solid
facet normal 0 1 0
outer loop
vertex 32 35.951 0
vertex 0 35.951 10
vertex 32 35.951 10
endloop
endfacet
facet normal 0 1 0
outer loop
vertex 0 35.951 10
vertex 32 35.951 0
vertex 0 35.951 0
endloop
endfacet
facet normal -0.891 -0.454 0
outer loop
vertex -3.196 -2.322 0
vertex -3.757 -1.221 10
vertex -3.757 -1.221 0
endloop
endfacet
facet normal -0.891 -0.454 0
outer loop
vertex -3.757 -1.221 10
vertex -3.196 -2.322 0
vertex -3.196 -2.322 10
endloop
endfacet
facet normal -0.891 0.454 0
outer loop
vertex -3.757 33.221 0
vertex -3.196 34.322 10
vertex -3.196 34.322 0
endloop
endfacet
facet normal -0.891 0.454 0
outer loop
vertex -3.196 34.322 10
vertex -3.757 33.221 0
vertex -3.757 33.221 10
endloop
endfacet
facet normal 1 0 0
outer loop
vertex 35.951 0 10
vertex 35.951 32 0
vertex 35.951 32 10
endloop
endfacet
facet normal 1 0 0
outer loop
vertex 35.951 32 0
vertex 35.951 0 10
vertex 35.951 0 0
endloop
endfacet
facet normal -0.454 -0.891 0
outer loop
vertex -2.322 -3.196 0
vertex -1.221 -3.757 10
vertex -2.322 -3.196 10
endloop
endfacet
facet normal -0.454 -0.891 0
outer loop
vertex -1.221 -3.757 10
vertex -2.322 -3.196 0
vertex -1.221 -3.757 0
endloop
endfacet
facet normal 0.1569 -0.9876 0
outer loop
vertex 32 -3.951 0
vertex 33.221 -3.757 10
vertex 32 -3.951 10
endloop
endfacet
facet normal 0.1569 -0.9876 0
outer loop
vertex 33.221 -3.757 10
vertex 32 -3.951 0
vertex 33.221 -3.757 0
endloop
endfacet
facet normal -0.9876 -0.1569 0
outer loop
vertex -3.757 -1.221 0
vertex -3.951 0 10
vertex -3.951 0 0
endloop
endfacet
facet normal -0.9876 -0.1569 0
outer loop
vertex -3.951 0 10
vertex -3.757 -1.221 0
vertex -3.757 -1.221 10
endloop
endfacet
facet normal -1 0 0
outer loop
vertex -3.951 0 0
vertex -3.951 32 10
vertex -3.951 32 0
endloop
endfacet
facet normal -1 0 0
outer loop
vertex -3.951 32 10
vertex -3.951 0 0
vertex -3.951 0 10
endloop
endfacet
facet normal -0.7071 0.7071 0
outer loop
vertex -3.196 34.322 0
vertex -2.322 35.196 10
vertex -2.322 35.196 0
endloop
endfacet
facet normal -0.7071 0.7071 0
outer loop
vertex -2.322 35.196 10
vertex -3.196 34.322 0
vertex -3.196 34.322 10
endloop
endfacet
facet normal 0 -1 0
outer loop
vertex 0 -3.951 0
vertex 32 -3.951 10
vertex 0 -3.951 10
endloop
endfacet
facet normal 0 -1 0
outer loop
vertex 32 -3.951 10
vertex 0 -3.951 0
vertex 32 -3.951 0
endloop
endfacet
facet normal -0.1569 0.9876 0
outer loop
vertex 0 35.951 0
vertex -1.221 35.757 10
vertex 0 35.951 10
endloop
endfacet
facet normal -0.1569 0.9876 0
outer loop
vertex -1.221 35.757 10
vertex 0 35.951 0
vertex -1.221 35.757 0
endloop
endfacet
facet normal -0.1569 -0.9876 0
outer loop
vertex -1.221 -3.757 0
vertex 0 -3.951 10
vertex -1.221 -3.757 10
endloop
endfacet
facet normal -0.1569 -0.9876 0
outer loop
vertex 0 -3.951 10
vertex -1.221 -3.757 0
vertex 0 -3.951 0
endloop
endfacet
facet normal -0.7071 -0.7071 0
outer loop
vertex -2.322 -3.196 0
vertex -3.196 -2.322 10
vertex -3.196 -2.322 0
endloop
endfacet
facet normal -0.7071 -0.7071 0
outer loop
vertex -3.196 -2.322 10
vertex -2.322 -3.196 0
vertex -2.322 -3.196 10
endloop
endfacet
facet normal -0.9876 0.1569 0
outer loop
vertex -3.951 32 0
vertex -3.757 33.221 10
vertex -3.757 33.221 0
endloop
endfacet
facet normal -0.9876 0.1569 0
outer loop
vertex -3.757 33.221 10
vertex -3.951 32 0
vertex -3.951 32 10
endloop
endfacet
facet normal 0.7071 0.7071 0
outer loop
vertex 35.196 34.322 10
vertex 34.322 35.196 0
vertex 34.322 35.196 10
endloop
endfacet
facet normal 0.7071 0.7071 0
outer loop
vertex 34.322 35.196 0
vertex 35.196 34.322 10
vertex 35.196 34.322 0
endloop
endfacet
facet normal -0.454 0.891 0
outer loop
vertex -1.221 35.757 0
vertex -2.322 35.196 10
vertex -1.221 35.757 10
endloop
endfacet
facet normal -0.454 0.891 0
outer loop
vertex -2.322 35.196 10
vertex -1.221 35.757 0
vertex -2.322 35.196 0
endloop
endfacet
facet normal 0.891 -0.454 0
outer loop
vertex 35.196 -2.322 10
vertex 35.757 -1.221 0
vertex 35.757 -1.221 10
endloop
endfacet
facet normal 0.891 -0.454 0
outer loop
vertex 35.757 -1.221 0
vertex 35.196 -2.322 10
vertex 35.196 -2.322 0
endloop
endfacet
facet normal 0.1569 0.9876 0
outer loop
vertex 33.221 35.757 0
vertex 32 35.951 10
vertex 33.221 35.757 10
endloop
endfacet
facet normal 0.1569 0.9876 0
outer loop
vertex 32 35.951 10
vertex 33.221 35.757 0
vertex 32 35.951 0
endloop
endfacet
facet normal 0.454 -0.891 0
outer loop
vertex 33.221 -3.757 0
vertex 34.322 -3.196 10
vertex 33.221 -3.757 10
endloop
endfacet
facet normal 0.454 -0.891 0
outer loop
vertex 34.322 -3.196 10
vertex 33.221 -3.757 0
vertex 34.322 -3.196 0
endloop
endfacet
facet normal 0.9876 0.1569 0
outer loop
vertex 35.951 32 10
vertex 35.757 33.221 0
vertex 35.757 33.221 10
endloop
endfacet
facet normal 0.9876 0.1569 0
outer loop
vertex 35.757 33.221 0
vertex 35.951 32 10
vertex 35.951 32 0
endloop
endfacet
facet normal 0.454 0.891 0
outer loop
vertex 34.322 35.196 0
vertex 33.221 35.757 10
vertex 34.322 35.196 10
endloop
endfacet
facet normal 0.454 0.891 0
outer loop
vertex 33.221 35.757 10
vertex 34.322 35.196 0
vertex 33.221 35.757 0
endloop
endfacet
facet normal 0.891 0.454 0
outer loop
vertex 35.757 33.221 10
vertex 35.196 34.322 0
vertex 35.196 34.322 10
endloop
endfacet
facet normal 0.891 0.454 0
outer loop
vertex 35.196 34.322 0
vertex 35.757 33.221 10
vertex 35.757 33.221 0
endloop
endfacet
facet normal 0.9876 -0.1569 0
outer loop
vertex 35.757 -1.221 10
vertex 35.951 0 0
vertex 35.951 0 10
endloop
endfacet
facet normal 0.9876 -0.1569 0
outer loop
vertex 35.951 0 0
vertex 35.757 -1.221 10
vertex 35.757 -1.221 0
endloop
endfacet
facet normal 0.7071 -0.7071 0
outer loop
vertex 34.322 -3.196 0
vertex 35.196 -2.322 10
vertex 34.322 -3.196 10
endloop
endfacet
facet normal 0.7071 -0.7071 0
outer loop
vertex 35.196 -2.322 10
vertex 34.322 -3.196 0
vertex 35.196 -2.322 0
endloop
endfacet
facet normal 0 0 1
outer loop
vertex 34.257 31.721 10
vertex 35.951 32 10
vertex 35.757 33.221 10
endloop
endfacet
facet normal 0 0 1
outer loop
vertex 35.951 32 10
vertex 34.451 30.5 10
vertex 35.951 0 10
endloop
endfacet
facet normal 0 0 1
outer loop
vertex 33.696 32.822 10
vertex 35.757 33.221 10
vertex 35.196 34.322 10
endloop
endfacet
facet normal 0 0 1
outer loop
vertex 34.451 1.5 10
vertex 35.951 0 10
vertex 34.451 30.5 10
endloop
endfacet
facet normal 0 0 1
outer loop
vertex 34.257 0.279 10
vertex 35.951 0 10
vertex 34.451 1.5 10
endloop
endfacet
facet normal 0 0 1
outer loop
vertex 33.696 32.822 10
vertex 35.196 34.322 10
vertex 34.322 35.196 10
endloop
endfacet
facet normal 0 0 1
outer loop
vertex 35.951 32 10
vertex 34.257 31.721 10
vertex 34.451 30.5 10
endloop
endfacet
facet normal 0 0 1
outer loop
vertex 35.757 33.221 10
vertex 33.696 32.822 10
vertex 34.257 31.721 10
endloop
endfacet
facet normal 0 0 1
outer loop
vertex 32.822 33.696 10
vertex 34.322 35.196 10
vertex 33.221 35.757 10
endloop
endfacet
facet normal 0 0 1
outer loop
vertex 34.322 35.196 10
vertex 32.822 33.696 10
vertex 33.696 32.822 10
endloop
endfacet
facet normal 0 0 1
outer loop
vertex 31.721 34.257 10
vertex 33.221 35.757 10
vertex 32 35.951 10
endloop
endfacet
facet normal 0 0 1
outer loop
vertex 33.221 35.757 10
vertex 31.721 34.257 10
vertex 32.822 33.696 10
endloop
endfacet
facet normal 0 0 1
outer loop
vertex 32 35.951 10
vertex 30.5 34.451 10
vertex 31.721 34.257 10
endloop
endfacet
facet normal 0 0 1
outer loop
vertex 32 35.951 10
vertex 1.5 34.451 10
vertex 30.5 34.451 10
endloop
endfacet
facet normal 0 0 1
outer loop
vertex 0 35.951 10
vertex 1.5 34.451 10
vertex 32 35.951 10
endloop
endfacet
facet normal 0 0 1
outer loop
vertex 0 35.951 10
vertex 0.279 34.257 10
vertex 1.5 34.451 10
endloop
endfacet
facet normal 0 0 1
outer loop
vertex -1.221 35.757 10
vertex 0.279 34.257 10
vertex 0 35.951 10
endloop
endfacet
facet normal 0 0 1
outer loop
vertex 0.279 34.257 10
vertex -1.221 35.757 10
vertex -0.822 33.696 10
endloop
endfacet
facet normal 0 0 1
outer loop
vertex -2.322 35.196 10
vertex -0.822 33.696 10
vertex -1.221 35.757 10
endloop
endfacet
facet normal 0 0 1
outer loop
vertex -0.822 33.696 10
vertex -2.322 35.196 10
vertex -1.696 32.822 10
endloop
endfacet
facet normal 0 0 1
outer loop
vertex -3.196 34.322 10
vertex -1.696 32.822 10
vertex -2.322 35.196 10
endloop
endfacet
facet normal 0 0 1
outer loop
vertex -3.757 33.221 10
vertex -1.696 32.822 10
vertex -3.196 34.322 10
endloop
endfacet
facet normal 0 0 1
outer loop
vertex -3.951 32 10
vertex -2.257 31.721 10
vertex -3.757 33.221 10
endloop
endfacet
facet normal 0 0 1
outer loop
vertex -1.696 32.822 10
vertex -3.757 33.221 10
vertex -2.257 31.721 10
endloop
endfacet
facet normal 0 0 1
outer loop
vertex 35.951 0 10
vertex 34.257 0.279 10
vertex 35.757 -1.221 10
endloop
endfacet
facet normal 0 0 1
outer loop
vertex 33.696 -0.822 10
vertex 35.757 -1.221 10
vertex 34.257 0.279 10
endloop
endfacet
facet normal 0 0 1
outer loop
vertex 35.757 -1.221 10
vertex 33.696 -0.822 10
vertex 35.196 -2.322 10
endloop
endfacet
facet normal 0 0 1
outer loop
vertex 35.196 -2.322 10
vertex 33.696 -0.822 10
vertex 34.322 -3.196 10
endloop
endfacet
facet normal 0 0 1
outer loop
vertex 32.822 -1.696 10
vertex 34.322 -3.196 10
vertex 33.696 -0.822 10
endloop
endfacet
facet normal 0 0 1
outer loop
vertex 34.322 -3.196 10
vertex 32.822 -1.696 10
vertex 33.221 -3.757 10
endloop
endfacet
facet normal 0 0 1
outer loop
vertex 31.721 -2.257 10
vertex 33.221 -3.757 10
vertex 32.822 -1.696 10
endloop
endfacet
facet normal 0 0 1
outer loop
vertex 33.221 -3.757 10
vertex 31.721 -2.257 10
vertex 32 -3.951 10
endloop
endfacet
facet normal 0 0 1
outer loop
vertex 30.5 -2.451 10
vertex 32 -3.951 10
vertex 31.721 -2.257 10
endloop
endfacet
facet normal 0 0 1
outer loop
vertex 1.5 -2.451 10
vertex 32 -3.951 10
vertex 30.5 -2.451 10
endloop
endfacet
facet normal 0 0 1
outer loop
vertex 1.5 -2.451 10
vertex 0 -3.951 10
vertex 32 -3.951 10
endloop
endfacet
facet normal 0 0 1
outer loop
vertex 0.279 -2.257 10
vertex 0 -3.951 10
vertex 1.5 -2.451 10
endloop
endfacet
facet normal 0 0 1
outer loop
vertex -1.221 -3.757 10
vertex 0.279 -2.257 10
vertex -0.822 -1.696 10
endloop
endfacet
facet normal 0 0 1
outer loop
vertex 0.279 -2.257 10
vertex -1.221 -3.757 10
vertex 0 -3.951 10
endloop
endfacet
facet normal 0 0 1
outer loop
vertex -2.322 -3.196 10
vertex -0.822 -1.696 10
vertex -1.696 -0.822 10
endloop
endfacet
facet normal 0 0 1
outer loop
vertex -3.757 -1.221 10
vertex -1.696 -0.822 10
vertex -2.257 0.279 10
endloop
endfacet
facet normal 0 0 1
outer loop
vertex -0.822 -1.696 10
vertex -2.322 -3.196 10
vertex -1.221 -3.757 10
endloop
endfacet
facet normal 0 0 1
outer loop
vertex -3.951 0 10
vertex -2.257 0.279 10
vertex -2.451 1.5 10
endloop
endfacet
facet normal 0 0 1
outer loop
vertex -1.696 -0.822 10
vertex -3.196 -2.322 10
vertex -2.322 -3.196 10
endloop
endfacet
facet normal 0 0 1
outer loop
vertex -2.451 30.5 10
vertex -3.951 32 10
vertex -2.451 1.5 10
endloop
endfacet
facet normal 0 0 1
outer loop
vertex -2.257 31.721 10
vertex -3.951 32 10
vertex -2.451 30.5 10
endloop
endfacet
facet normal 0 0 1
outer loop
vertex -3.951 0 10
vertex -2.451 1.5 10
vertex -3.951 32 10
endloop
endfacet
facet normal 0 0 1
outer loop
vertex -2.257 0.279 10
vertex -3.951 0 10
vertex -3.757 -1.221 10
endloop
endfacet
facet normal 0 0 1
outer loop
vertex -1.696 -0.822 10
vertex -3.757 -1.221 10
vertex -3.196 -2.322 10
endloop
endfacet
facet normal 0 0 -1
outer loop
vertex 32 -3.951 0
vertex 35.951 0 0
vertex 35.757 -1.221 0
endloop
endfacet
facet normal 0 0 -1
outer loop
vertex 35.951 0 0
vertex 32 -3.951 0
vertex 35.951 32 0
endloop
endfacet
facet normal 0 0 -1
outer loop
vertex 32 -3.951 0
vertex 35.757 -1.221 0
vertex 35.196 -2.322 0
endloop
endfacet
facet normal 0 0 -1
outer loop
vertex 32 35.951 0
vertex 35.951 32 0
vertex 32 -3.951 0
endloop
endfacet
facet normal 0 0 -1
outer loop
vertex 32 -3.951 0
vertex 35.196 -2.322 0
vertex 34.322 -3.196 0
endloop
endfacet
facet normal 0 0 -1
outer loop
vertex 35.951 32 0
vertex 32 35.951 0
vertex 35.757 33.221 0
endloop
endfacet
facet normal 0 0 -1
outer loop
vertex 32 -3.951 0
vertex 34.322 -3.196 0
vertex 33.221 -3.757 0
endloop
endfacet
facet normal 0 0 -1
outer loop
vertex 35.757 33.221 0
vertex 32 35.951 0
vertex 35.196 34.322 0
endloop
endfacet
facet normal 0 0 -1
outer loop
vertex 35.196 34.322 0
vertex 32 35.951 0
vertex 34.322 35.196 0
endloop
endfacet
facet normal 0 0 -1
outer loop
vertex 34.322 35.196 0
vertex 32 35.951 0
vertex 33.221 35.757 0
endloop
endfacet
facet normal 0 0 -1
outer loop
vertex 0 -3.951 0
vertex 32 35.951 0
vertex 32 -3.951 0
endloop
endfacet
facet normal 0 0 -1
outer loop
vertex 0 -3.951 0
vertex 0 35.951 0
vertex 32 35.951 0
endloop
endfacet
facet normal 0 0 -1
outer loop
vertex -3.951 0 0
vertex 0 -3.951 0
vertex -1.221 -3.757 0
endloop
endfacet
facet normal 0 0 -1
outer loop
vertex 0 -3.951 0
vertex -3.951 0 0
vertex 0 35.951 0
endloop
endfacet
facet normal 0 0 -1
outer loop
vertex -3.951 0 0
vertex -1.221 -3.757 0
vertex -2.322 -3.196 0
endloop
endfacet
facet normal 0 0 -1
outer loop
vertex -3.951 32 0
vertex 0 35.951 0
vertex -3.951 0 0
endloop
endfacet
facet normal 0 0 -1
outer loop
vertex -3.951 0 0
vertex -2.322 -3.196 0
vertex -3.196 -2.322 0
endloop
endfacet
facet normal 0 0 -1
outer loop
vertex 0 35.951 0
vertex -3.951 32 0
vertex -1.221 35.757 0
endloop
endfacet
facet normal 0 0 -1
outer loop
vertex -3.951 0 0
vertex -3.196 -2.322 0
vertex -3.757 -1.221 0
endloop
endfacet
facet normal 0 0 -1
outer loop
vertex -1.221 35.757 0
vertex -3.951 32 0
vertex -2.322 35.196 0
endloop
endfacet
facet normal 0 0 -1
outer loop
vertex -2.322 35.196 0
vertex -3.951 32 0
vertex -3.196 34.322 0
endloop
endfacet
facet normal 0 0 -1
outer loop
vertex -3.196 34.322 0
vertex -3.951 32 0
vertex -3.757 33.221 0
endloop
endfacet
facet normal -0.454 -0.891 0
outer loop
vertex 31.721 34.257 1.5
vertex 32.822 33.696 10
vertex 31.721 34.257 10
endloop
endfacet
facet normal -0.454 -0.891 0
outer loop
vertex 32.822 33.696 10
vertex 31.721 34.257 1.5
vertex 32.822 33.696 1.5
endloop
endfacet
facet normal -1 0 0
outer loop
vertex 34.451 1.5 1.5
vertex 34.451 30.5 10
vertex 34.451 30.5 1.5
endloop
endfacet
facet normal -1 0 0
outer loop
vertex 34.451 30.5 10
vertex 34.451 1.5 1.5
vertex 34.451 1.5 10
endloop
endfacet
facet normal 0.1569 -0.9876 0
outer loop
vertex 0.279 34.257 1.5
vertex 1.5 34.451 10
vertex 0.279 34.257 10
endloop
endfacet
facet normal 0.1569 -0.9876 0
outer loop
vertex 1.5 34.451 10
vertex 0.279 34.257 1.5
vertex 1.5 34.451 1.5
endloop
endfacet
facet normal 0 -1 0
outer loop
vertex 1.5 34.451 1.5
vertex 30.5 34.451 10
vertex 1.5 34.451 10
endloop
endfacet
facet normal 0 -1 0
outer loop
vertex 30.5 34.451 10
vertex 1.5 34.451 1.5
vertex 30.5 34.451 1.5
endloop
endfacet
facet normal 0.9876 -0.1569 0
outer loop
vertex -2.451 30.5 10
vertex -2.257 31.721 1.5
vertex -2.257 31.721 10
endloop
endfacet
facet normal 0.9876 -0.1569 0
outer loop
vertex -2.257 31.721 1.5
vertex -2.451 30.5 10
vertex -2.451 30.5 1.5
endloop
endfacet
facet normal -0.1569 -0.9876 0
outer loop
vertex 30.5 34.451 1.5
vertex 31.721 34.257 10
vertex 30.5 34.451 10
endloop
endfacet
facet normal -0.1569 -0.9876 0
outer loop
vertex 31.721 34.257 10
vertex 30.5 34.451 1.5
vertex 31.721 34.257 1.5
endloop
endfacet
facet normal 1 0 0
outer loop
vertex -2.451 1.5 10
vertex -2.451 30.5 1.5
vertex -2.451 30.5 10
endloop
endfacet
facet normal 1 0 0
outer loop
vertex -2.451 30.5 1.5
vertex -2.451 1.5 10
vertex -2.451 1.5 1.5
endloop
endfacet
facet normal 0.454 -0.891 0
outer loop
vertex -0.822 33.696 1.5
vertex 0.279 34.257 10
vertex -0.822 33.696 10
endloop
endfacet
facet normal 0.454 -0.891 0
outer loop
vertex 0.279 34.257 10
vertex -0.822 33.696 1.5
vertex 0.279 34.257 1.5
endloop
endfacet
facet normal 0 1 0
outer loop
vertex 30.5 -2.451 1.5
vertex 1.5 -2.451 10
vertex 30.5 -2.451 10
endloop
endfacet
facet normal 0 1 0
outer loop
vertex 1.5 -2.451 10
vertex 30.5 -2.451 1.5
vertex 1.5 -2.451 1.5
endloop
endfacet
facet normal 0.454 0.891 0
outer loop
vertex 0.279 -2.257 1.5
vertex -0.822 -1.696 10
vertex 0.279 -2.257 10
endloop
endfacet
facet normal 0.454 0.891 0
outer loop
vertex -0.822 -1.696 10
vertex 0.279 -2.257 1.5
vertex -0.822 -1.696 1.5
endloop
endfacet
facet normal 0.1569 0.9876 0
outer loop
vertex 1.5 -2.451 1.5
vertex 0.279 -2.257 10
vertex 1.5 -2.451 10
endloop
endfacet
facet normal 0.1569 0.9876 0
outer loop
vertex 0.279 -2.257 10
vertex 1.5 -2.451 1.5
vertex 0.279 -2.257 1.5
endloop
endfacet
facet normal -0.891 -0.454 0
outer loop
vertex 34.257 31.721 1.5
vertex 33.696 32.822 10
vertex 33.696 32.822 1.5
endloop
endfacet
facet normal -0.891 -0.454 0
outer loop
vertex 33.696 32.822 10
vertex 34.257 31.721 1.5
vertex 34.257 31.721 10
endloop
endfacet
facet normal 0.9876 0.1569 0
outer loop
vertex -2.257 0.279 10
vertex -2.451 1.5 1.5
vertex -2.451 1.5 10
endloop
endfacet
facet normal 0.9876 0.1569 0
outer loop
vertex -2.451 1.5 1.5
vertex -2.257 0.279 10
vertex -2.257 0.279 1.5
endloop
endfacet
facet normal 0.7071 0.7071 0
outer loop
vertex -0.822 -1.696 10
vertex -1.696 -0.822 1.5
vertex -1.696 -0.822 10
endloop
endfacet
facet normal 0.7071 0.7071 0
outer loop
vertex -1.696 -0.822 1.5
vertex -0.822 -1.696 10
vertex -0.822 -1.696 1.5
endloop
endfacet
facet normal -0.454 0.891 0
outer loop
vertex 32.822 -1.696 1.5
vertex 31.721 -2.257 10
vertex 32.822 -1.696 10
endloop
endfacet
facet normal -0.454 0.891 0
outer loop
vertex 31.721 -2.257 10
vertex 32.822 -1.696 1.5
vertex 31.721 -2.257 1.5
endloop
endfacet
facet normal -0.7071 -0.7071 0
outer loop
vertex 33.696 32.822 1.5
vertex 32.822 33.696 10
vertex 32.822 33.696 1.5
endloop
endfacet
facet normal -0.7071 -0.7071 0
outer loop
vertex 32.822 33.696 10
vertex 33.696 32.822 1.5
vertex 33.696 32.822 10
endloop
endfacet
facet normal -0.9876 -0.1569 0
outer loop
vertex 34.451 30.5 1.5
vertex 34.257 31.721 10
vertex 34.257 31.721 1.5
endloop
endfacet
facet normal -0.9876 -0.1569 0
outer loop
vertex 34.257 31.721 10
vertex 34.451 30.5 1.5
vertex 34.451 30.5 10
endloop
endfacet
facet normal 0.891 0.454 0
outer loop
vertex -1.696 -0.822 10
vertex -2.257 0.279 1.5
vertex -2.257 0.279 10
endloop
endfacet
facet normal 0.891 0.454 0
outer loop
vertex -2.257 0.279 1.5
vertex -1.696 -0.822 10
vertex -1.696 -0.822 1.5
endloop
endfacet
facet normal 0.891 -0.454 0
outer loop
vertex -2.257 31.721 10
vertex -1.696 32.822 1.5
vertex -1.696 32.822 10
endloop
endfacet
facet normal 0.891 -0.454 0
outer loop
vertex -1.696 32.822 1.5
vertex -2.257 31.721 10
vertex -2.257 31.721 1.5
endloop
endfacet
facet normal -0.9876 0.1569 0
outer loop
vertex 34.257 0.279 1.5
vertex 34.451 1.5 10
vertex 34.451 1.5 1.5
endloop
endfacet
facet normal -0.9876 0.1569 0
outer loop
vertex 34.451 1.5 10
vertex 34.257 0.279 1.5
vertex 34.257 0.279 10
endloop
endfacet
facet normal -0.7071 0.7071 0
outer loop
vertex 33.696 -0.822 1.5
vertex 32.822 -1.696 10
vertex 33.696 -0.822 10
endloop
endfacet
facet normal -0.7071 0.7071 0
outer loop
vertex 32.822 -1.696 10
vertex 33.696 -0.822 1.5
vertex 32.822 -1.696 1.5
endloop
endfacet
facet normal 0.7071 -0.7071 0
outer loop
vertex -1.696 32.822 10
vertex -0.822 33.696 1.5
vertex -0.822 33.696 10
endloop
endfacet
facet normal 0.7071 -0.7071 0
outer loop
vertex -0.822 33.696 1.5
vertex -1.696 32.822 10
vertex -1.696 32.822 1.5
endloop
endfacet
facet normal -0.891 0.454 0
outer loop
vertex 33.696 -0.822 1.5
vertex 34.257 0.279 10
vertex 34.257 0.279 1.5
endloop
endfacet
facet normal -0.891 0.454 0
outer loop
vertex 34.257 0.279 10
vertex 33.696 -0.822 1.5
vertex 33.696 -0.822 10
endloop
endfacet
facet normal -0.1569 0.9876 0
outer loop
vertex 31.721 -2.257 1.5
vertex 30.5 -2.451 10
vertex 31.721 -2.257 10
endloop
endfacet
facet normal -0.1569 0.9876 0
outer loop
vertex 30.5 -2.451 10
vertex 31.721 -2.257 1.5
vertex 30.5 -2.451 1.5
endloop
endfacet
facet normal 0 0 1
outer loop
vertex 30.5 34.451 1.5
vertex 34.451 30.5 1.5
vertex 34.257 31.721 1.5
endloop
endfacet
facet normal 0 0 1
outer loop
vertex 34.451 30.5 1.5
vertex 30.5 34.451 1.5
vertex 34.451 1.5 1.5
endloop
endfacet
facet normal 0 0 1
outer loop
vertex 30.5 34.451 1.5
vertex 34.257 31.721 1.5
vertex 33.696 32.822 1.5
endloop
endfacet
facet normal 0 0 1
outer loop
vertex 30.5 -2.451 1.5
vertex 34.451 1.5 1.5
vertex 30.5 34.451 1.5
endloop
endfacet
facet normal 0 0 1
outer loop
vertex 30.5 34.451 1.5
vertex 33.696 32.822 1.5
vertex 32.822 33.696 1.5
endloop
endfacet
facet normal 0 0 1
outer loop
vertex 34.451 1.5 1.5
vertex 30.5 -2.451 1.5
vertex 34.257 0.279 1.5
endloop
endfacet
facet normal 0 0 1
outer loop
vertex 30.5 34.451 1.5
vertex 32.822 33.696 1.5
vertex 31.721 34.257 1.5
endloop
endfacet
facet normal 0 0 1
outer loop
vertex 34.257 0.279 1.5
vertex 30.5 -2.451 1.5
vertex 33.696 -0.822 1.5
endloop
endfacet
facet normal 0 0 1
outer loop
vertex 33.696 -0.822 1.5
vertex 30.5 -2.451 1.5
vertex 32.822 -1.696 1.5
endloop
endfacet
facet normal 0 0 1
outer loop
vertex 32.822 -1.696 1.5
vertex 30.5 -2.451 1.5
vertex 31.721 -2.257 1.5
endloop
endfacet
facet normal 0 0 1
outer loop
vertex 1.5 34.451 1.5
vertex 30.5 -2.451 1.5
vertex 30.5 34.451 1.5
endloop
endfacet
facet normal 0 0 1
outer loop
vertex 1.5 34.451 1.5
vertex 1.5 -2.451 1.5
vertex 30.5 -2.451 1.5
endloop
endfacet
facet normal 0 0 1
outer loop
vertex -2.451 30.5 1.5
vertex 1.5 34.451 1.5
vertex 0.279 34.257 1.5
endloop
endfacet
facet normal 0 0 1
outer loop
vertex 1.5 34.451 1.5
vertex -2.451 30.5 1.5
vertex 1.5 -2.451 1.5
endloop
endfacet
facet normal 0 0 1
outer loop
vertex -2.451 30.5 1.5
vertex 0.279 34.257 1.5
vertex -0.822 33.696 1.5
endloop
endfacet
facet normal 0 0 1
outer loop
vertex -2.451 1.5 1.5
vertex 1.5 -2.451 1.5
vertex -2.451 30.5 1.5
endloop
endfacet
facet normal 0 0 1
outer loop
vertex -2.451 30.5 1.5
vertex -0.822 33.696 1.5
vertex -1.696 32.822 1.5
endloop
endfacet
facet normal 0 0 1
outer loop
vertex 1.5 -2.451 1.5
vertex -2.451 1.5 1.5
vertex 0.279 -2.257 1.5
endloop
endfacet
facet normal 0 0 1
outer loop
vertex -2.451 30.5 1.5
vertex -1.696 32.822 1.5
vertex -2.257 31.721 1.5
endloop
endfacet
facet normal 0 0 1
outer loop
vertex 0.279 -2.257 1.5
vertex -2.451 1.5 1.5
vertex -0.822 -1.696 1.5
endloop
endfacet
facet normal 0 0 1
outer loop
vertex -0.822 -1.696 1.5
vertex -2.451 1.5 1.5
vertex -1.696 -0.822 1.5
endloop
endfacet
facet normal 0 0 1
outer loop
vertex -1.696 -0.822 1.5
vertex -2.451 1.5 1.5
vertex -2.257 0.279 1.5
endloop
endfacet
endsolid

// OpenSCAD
largeur_pi = 40;
longueur_pi = 40;
hauteur_gpio = 10;
epaisseur = 1.5;
rayon_arrondi = 4;
detail = 20;



module rounded_block(longueur, largeur, hauteur, rayon){
	difference(){
		minkowski(){
			cube([longueur-2*rayon, largeur-2*rayon, hauteur]);
			sphere (rayon, $fn=detail);
		}
		translate([-rayon,-rayon,hauteur]) cube([longueur, largeur, rayon]);
		translate([-rayon,-rayon,-rayon]) cube([longueur, largeur, rayon]);
	}
	
}

module rounded_box(longueur, largeur, hauteur, rayon, epaisseur){
	difference(){
		rounded_block(longueur, largeur, hauteur, rayon);
		translate([epaisseur,epaisseur,epaisseur]) rounded_block(longueur-2*epaisseur, largeur-2*epaisseur, hauteur, rayon);
	}
	
}

rounded_box(largeur_pi, longueur_pi, hauteur_gpio, rayon_arrondi, epaisseur);
